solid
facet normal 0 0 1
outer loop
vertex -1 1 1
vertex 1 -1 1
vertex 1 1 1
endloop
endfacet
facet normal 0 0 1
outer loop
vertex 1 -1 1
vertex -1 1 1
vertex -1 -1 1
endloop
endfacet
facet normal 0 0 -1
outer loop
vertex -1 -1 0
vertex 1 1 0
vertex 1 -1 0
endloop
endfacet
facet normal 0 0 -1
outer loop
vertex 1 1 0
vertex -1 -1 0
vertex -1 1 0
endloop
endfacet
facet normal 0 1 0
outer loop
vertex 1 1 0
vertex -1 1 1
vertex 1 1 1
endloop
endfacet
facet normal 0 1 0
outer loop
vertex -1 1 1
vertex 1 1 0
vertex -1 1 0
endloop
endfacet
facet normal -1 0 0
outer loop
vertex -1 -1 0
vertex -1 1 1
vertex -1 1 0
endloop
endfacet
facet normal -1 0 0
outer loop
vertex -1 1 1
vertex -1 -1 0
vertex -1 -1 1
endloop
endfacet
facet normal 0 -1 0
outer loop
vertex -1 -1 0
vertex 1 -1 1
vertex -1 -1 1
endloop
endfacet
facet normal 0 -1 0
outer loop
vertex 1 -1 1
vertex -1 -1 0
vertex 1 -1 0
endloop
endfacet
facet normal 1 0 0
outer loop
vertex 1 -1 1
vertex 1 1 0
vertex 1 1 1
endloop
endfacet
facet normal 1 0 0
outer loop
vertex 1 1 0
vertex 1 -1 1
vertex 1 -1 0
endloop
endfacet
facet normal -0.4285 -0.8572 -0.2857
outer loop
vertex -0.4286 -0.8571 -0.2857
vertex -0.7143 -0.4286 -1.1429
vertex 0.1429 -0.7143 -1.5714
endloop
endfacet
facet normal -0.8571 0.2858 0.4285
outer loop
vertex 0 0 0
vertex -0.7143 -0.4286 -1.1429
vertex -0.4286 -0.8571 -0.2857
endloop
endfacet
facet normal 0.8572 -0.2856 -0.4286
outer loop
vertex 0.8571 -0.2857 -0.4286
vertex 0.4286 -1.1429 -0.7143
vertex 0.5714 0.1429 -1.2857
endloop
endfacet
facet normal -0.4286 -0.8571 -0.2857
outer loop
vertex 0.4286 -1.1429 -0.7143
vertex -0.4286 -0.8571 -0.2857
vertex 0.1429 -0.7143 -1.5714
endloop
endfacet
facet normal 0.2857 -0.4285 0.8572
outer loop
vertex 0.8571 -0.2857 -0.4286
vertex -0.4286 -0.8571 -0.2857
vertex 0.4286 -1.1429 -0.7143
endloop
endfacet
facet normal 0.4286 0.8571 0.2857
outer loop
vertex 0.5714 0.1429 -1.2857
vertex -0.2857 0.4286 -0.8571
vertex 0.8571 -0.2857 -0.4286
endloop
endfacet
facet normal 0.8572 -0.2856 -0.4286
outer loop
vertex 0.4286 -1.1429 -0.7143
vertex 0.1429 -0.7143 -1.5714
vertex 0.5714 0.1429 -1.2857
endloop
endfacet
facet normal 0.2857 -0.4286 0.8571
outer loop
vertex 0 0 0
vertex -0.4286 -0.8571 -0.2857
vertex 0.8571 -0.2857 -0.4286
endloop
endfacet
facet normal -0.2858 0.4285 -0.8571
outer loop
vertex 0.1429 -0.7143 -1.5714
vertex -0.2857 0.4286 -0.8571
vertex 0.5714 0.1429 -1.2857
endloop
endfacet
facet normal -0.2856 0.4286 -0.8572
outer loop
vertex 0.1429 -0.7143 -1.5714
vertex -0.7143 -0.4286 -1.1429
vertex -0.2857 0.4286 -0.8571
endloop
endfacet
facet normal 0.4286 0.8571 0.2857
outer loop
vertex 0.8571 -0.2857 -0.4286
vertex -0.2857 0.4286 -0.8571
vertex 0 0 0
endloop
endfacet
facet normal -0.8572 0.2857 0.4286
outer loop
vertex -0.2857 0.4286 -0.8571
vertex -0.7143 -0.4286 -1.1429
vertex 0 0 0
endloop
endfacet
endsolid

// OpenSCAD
mirror([1, 0, 0]) cube();
mirror([1, 1, 0]) cube();
mirror([0, 1]) cube();
mirror([1, 2, 3]) cube();
mirror([0, 0, 0]) cube();
mirror() cube();
